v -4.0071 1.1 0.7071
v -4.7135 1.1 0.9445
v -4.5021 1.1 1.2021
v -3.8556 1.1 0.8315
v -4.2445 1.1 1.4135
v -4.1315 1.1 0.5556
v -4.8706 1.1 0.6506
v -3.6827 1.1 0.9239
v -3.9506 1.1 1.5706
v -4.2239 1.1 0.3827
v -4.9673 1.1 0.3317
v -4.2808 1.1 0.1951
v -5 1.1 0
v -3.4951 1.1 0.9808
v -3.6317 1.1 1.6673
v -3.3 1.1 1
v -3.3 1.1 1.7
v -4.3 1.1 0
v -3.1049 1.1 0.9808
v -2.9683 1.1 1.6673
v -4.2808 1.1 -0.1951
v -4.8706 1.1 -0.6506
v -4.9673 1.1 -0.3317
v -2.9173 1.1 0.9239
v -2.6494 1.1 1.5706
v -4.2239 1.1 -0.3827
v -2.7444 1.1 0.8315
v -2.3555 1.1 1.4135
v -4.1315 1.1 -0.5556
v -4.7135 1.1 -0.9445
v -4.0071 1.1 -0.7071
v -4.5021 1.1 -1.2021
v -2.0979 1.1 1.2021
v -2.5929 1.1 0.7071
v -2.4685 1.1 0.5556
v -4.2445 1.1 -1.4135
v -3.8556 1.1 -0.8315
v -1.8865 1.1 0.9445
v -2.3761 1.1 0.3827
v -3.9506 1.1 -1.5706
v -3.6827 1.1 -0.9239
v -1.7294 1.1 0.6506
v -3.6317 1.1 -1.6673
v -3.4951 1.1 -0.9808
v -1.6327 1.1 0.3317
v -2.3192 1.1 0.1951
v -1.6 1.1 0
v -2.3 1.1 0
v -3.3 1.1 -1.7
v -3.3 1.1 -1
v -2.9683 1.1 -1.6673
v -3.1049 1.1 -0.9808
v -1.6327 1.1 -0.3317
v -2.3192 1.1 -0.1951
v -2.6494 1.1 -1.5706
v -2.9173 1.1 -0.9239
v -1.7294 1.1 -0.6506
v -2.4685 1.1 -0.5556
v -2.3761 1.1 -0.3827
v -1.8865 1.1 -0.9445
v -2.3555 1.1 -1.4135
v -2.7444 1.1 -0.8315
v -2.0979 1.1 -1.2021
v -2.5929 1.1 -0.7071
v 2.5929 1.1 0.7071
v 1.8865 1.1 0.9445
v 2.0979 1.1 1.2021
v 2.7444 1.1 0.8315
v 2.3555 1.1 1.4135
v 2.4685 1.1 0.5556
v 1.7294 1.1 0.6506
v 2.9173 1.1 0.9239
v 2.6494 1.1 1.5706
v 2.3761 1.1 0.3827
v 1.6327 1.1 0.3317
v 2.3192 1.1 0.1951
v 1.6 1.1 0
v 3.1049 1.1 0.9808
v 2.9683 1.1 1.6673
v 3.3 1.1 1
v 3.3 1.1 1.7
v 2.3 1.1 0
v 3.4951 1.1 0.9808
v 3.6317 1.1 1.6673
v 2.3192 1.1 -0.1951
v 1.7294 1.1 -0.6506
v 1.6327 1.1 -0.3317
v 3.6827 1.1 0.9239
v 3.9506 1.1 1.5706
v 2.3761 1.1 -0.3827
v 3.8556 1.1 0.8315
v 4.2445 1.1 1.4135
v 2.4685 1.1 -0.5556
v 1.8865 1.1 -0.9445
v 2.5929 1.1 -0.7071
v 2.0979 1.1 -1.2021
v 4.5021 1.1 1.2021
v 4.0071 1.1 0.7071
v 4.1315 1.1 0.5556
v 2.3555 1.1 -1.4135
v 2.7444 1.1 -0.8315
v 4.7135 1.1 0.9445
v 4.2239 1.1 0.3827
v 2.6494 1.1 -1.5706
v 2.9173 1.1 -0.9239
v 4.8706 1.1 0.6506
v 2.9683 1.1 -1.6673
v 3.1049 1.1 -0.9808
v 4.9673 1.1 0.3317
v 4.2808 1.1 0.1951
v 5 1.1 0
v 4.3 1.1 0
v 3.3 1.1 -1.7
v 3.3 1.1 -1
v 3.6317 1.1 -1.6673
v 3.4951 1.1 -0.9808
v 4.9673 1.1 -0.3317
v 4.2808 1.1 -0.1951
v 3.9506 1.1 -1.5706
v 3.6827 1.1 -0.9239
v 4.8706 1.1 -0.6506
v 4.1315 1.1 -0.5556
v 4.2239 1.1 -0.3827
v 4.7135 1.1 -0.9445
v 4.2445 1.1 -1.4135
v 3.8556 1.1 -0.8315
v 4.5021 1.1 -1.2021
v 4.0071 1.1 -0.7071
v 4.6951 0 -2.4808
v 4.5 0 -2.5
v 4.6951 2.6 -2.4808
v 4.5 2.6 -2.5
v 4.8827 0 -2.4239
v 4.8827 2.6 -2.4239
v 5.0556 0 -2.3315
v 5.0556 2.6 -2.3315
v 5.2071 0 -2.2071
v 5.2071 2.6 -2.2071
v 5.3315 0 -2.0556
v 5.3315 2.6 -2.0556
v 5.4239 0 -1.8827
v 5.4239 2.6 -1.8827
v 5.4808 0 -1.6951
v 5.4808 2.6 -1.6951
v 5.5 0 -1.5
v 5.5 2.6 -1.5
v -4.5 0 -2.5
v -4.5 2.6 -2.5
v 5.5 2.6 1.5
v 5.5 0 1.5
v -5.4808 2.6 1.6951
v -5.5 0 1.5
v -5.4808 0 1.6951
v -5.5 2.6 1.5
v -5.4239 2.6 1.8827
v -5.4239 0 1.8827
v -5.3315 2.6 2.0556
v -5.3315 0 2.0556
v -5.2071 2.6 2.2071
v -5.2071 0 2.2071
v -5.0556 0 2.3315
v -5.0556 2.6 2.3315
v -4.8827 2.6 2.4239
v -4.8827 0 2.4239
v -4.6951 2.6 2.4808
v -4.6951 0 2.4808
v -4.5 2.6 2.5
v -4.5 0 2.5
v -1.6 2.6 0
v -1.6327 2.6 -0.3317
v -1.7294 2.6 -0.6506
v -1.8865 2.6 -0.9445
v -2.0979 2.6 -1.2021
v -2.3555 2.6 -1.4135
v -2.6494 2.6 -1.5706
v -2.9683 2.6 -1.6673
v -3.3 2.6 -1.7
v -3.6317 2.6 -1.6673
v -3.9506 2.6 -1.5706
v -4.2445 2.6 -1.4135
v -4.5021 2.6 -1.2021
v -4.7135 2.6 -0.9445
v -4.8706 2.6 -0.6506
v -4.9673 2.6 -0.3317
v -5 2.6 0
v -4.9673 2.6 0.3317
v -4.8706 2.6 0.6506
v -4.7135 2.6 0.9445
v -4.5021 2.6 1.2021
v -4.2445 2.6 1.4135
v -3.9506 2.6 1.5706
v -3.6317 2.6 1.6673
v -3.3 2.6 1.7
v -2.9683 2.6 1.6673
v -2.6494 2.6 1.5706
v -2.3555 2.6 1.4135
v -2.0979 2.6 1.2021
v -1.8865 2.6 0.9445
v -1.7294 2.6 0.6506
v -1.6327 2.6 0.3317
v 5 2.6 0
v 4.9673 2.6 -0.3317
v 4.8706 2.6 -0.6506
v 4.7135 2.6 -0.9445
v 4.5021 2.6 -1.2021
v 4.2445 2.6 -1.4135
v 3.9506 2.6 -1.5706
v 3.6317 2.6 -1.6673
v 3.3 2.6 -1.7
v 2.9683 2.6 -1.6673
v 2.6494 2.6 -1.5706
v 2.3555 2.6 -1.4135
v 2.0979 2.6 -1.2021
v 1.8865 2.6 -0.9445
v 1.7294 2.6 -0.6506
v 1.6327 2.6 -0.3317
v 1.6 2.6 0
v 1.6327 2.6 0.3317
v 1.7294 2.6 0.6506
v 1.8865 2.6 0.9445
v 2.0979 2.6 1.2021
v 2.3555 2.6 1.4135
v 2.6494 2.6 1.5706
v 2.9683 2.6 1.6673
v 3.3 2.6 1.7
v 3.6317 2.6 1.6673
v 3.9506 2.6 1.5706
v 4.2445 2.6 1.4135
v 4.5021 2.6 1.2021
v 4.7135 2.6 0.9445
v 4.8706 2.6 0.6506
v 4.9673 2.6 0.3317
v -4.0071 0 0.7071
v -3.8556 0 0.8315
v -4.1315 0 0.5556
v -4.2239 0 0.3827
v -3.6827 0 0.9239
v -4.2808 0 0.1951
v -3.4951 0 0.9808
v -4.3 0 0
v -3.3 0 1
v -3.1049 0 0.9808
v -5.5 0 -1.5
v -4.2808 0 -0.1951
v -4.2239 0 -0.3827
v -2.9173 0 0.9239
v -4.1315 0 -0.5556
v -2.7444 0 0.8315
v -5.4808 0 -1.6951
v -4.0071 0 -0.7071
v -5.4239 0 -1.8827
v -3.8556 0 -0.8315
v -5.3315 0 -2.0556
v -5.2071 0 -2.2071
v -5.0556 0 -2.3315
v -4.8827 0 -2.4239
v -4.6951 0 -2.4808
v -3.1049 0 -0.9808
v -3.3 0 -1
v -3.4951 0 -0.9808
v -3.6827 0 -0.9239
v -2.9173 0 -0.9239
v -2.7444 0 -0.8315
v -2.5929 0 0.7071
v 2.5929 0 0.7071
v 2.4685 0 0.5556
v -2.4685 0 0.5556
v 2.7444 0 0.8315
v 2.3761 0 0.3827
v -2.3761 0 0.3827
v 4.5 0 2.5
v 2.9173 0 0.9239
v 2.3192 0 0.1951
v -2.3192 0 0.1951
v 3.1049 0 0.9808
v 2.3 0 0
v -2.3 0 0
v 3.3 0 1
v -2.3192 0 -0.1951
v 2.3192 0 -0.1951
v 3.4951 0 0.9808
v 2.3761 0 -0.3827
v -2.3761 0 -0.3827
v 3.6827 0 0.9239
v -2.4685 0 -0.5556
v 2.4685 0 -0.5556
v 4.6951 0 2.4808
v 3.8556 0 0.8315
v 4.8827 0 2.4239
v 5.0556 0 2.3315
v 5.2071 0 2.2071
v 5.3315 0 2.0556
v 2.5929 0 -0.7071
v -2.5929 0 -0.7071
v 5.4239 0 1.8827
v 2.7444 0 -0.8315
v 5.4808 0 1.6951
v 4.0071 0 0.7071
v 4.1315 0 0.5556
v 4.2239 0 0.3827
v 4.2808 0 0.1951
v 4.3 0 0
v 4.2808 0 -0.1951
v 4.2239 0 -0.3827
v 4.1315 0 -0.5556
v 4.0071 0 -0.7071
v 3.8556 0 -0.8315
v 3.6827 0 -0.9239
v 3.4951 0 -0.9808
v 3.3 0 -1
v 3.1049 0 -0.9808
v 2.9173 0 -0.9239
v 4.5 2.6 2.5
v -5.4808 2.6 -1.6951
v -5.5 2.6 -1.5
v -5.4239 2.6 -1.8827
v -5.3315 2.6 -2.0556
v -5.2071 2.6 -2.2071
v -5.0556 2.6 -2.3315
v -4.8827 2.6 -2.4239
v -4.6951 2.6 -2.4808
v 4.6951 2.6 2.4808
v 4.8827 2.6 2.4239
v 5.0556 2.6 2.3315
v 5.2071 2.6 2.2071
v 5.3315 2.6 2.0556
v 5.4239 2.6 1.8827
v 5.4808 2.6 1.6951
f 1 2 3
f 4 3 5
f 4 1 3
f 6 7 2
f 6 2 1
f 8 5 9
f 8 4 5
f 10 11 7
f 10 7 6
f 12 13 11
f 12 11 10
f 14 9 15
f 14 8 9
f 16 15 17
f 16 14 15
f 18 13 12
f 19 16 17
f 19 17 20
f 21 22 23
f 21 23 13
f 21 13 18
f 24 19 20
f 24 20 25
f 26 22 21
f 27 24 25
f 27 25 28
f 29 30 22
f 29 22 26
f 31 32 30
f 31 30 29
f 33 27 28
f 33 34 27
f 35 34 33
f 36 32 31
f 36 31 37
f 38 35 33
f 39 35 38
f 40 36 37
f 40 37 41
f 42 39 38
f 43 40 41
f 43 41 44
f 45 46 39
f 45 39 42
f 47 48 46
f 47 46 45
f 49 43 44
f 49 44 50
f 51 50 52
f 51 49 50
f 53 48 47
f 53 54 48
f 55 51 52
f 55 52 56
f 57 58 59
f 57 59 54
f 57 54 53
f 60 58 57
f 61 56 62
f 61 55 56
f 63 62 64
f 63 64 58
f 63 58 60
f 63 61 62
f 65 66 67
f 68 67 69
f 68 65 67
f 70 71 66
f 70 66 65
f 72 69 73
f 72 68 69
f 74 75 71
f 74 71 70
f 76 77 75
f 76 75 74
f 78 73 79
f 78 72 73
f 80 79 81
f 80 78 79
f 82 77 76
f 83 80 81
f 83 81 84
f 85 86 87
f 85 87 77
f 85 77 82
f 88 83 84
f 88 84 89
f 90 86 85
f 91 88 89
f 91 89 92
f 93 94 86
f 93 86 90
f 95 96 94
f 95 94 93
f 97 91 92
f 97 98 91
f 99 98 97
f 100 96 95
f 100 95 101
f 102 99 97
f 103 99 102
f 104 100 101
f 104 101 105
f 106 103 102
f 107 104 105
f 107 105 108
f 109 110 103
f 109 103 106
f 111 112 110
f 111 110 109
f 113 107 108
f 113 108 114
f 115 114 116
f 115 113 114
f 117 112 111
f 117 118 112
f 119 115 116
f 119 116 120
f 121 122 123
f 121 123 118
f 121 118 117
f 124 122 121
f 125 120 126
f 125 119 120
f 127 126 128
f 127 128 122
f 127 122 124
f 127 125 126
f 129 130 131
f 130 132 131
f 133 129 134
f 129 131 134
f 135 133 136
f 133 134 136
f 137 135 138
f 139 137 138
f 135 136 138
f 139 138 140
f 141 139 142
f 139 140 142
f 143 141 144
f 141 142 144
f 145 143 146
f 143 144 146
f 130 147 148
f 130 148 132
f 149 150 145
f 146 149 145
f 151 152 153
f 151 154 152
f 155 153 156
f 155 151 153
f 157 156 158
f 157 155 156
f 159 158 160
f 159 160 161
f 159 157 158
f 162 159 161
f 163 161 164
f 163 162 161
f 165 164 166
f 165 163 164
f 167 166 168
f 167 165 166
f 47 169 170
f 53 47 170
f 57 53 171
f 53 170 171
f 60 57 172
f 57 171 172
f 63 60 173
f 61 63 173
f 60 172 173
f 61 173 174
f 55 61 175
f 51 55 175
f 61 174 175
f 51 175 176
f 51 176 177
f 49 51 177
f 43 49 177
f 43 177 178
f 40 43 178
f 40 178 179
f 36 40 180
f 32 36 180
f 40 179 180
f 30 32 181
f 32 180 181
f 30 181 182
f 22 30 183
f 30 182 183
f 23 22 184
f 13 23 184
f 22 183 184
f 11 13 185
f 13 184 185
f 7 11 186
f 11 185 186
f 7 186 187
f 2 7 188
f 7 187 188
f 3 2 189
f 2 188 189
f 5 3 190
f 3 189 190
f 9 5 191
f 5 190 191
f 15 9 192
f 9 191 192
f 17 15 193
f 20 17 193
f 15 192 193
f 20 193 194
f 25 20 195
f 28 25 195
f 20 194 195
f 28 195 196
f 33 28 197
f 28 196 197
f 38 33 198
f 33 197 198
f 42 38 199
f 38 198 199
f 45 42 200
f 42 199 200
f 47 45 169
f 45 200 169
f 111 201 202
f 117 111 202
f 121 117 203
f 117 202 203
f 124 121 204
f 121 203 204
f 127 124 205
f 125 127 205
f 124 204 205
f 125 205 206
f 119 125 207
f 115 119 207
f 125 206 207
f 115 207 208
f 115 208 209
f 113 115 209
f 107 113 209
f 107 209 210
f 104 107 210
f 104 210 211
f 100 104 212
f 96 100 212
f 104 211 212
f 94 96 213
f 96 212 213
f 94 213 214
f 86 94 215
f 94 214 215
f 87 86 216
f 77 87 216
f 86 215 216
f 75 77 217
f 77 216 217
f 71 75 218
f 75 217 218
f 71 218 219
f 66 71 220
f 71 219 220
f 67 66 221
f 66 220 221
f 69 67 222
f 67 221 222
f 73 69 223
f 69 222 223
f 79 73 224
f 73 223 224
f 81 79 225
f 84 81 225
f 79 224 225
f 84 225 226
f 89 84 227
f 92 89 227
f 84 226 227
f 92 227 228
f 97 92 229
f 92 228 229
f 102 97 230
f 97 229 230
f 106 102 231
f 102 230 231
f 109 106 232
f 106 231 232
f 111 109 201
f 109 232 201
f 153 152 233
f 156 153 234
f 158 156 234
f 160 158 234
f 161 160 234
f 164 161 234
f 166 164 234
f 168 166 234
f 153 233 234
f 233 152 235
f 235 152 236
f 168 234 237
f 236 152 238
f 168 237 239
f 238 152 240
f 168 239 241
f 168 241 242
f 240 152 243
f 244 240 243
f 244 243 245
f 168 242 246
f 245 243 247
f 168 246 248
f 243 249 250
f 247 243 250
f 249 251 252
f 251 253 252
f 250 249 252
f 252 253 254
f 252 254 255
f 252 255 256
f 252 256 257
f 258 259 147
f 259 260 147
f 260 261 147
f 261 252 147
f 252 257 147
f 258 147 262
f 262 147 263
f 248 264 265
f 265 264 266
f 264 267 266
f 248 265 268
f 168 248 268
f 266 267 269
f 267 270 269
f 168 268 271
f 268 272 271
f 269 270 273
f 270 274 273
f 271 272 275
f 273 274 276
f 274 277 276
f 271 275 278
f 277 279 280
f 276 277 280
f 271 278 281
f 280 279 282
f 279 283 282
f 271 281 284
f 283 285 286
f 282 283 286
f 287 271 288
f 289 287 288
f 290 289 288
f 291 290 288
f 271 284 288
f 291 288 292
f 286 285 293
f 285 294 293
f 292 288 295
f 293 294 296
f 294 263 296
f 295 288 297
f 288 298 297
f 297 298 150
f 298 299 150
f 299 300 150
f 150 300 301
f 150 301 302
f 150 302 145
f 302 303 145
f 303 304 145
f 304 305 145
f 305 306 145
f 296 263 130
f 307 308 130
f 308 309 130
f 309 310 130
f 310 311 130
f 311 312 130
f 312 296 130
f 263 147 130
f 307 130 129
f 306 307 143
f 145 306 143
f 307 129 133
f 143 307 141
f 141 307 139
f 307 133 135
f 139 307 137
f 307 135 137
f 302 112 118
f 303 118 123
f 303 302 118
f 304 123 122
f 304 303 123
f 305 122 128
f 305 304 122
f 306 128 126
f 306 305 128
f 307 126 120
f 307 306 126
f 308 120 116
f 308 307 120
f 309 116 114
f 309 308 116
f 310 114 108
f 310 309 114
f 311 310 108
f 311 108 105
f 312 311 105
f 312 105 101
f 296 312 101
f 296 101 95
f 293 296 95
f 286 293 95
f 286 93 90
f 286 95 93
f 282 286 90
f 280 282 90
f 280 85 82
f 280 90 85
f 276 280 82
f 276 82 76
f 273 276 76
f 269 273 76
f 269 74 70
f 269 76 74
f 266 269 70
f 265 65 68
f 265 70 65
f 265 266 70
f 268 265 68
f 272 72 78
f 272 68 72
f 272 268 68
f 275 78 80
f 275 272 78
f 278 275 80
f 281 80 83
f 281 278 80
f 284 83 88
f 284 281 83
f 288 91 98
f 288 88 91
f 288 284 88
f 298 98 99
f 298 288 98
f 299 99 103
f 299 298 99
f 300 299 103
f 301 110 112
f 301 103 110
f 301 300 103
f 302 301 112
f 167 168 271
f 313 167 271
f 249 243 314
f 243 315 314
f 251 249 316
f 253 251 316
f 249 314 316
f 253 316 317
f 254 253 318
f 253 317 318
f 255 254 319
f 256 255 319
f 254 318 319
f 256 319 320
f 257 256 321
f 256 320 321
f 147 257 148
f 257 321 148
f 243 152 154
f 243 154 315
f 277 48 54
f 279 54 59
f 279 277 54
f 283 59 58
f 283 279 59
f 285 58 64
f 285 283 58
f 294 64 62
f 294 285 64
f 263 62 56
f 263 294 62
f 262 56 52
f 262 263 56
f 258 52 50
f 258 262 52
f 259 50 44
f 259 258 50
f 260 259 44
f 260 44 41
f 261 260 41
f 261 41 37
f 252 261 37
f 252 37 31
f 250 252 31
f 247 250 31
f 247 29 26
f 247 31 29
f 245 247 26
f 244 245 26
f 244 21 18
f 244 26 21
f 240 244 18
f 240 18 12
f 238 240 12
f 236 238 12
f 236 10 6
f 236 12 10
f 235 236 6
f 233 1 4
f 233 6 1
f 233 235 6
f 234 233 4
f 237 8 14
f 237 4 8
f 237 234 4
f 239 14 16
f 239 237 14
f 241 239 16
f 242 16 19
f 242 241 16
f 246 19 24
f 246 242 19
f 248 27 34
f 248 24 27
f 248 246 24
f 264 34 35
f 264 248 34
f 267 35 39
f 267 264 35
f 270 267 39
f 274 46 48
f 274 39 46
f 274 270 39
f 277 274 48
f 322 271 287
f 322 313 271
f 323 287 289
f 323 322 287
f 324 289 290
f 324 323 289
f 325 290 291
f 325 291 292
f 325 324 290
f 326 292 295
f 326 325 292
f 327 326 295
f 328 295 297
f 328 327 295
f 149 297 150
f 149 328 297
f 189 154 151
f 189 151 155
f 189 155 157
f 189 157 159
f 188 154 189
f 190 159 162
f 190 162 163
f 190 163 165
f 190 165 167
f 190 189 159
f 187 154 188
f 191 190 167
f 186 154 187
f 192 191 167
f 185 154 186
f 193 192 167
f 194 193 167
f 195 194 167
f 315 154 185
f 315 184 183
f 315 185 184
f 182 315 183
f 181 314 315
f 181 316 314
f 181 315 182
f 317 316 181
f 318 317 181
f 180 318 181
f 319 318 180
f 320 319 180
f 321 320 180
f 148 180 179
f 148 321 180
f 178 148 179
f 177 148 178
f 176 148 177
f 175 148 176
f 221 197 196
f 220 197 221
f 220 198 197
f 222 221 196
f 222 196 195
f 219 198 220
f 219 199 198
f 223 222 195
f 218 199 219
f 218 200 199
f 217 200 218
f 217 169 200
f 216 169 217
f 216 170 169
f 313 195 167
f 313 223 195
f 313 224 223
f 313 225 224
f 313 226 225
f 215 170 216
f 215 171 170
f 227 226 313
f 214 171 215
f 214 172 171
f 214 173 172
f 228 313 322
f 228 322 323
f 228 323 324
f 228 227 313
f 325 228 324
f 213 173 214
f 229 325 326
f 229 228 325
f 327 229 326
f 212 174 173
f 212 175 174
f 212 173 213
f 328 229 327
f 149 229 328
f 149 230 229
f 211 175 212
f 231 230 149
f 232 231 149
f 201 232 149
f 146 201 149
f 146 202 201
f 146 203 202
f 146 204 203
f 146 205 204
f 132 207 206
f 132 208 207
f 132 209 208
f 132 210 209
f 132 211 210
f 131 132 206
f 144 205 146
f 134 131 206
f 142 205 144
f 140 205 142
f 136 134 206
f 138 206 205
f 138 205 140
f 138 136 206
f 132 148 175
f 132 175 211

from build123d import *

# Parameters (mm, degrees)
SKETCH1_W           = 11
SKETCH1_H           = 5
SKETCH1_R           = 1
BOSS_EXTRUDE1_DEPTH = 2.6
SKETCH2_R           = 1.7
CUT_EXTRUDE1_DEPTH  = 1.5
FILLET1_R           = 1


with BuildPart() as part:
    # Sketch1 → Boss-Extrude1 (new body)
    with BuildSketch(Plane(origin=(0, 0, 0), x_dir=(1, 0, 0), z_dir=(0, 1, 0))):
        Rectangle(SKETCH1_W, SKETCH1_H)
        with Locations((-3.3, 0)):
            Circle(SKETCH1_R, mode=Mode.SUBTRACT)
        with Locations((3.3, 0)):
            Circle(SKETCH1_R, mode=Mode.SUBTRACT)
    extrude(amount=BOSS_EXTRUDE1_DEPTH)

    # Sketch2 → Cut-Extrude1 (cut)
    with BuildSketch(Plane(origin=(0, 2.6, 0), x_dir=(1, 0, 0), z_dir=(0, 1, 0))):
        with Locations((-3.3, 0)):
            Circle(SKETCH2_R)
        with Locations((3.3, 0)):
            Circle(SKETCH2_R)
    extrude(amount=-CUT_EXTRUDE1_DEPTH, mode=Mode.SUBTRACT)

    # Fillet1
    fillet1_edges = [part.edges().sort_by_distance(p)[0] for p in [
        (5.5, 1.3, 2.5),
        (-5.5, 1.3, 2.5),
        (-5.5, 1.3, -2.5),
        (5.5, 1.3, -2.5),
    ]]
    fillet(fillet1_edges, radius=FILLET1_R)


solid = part.part
